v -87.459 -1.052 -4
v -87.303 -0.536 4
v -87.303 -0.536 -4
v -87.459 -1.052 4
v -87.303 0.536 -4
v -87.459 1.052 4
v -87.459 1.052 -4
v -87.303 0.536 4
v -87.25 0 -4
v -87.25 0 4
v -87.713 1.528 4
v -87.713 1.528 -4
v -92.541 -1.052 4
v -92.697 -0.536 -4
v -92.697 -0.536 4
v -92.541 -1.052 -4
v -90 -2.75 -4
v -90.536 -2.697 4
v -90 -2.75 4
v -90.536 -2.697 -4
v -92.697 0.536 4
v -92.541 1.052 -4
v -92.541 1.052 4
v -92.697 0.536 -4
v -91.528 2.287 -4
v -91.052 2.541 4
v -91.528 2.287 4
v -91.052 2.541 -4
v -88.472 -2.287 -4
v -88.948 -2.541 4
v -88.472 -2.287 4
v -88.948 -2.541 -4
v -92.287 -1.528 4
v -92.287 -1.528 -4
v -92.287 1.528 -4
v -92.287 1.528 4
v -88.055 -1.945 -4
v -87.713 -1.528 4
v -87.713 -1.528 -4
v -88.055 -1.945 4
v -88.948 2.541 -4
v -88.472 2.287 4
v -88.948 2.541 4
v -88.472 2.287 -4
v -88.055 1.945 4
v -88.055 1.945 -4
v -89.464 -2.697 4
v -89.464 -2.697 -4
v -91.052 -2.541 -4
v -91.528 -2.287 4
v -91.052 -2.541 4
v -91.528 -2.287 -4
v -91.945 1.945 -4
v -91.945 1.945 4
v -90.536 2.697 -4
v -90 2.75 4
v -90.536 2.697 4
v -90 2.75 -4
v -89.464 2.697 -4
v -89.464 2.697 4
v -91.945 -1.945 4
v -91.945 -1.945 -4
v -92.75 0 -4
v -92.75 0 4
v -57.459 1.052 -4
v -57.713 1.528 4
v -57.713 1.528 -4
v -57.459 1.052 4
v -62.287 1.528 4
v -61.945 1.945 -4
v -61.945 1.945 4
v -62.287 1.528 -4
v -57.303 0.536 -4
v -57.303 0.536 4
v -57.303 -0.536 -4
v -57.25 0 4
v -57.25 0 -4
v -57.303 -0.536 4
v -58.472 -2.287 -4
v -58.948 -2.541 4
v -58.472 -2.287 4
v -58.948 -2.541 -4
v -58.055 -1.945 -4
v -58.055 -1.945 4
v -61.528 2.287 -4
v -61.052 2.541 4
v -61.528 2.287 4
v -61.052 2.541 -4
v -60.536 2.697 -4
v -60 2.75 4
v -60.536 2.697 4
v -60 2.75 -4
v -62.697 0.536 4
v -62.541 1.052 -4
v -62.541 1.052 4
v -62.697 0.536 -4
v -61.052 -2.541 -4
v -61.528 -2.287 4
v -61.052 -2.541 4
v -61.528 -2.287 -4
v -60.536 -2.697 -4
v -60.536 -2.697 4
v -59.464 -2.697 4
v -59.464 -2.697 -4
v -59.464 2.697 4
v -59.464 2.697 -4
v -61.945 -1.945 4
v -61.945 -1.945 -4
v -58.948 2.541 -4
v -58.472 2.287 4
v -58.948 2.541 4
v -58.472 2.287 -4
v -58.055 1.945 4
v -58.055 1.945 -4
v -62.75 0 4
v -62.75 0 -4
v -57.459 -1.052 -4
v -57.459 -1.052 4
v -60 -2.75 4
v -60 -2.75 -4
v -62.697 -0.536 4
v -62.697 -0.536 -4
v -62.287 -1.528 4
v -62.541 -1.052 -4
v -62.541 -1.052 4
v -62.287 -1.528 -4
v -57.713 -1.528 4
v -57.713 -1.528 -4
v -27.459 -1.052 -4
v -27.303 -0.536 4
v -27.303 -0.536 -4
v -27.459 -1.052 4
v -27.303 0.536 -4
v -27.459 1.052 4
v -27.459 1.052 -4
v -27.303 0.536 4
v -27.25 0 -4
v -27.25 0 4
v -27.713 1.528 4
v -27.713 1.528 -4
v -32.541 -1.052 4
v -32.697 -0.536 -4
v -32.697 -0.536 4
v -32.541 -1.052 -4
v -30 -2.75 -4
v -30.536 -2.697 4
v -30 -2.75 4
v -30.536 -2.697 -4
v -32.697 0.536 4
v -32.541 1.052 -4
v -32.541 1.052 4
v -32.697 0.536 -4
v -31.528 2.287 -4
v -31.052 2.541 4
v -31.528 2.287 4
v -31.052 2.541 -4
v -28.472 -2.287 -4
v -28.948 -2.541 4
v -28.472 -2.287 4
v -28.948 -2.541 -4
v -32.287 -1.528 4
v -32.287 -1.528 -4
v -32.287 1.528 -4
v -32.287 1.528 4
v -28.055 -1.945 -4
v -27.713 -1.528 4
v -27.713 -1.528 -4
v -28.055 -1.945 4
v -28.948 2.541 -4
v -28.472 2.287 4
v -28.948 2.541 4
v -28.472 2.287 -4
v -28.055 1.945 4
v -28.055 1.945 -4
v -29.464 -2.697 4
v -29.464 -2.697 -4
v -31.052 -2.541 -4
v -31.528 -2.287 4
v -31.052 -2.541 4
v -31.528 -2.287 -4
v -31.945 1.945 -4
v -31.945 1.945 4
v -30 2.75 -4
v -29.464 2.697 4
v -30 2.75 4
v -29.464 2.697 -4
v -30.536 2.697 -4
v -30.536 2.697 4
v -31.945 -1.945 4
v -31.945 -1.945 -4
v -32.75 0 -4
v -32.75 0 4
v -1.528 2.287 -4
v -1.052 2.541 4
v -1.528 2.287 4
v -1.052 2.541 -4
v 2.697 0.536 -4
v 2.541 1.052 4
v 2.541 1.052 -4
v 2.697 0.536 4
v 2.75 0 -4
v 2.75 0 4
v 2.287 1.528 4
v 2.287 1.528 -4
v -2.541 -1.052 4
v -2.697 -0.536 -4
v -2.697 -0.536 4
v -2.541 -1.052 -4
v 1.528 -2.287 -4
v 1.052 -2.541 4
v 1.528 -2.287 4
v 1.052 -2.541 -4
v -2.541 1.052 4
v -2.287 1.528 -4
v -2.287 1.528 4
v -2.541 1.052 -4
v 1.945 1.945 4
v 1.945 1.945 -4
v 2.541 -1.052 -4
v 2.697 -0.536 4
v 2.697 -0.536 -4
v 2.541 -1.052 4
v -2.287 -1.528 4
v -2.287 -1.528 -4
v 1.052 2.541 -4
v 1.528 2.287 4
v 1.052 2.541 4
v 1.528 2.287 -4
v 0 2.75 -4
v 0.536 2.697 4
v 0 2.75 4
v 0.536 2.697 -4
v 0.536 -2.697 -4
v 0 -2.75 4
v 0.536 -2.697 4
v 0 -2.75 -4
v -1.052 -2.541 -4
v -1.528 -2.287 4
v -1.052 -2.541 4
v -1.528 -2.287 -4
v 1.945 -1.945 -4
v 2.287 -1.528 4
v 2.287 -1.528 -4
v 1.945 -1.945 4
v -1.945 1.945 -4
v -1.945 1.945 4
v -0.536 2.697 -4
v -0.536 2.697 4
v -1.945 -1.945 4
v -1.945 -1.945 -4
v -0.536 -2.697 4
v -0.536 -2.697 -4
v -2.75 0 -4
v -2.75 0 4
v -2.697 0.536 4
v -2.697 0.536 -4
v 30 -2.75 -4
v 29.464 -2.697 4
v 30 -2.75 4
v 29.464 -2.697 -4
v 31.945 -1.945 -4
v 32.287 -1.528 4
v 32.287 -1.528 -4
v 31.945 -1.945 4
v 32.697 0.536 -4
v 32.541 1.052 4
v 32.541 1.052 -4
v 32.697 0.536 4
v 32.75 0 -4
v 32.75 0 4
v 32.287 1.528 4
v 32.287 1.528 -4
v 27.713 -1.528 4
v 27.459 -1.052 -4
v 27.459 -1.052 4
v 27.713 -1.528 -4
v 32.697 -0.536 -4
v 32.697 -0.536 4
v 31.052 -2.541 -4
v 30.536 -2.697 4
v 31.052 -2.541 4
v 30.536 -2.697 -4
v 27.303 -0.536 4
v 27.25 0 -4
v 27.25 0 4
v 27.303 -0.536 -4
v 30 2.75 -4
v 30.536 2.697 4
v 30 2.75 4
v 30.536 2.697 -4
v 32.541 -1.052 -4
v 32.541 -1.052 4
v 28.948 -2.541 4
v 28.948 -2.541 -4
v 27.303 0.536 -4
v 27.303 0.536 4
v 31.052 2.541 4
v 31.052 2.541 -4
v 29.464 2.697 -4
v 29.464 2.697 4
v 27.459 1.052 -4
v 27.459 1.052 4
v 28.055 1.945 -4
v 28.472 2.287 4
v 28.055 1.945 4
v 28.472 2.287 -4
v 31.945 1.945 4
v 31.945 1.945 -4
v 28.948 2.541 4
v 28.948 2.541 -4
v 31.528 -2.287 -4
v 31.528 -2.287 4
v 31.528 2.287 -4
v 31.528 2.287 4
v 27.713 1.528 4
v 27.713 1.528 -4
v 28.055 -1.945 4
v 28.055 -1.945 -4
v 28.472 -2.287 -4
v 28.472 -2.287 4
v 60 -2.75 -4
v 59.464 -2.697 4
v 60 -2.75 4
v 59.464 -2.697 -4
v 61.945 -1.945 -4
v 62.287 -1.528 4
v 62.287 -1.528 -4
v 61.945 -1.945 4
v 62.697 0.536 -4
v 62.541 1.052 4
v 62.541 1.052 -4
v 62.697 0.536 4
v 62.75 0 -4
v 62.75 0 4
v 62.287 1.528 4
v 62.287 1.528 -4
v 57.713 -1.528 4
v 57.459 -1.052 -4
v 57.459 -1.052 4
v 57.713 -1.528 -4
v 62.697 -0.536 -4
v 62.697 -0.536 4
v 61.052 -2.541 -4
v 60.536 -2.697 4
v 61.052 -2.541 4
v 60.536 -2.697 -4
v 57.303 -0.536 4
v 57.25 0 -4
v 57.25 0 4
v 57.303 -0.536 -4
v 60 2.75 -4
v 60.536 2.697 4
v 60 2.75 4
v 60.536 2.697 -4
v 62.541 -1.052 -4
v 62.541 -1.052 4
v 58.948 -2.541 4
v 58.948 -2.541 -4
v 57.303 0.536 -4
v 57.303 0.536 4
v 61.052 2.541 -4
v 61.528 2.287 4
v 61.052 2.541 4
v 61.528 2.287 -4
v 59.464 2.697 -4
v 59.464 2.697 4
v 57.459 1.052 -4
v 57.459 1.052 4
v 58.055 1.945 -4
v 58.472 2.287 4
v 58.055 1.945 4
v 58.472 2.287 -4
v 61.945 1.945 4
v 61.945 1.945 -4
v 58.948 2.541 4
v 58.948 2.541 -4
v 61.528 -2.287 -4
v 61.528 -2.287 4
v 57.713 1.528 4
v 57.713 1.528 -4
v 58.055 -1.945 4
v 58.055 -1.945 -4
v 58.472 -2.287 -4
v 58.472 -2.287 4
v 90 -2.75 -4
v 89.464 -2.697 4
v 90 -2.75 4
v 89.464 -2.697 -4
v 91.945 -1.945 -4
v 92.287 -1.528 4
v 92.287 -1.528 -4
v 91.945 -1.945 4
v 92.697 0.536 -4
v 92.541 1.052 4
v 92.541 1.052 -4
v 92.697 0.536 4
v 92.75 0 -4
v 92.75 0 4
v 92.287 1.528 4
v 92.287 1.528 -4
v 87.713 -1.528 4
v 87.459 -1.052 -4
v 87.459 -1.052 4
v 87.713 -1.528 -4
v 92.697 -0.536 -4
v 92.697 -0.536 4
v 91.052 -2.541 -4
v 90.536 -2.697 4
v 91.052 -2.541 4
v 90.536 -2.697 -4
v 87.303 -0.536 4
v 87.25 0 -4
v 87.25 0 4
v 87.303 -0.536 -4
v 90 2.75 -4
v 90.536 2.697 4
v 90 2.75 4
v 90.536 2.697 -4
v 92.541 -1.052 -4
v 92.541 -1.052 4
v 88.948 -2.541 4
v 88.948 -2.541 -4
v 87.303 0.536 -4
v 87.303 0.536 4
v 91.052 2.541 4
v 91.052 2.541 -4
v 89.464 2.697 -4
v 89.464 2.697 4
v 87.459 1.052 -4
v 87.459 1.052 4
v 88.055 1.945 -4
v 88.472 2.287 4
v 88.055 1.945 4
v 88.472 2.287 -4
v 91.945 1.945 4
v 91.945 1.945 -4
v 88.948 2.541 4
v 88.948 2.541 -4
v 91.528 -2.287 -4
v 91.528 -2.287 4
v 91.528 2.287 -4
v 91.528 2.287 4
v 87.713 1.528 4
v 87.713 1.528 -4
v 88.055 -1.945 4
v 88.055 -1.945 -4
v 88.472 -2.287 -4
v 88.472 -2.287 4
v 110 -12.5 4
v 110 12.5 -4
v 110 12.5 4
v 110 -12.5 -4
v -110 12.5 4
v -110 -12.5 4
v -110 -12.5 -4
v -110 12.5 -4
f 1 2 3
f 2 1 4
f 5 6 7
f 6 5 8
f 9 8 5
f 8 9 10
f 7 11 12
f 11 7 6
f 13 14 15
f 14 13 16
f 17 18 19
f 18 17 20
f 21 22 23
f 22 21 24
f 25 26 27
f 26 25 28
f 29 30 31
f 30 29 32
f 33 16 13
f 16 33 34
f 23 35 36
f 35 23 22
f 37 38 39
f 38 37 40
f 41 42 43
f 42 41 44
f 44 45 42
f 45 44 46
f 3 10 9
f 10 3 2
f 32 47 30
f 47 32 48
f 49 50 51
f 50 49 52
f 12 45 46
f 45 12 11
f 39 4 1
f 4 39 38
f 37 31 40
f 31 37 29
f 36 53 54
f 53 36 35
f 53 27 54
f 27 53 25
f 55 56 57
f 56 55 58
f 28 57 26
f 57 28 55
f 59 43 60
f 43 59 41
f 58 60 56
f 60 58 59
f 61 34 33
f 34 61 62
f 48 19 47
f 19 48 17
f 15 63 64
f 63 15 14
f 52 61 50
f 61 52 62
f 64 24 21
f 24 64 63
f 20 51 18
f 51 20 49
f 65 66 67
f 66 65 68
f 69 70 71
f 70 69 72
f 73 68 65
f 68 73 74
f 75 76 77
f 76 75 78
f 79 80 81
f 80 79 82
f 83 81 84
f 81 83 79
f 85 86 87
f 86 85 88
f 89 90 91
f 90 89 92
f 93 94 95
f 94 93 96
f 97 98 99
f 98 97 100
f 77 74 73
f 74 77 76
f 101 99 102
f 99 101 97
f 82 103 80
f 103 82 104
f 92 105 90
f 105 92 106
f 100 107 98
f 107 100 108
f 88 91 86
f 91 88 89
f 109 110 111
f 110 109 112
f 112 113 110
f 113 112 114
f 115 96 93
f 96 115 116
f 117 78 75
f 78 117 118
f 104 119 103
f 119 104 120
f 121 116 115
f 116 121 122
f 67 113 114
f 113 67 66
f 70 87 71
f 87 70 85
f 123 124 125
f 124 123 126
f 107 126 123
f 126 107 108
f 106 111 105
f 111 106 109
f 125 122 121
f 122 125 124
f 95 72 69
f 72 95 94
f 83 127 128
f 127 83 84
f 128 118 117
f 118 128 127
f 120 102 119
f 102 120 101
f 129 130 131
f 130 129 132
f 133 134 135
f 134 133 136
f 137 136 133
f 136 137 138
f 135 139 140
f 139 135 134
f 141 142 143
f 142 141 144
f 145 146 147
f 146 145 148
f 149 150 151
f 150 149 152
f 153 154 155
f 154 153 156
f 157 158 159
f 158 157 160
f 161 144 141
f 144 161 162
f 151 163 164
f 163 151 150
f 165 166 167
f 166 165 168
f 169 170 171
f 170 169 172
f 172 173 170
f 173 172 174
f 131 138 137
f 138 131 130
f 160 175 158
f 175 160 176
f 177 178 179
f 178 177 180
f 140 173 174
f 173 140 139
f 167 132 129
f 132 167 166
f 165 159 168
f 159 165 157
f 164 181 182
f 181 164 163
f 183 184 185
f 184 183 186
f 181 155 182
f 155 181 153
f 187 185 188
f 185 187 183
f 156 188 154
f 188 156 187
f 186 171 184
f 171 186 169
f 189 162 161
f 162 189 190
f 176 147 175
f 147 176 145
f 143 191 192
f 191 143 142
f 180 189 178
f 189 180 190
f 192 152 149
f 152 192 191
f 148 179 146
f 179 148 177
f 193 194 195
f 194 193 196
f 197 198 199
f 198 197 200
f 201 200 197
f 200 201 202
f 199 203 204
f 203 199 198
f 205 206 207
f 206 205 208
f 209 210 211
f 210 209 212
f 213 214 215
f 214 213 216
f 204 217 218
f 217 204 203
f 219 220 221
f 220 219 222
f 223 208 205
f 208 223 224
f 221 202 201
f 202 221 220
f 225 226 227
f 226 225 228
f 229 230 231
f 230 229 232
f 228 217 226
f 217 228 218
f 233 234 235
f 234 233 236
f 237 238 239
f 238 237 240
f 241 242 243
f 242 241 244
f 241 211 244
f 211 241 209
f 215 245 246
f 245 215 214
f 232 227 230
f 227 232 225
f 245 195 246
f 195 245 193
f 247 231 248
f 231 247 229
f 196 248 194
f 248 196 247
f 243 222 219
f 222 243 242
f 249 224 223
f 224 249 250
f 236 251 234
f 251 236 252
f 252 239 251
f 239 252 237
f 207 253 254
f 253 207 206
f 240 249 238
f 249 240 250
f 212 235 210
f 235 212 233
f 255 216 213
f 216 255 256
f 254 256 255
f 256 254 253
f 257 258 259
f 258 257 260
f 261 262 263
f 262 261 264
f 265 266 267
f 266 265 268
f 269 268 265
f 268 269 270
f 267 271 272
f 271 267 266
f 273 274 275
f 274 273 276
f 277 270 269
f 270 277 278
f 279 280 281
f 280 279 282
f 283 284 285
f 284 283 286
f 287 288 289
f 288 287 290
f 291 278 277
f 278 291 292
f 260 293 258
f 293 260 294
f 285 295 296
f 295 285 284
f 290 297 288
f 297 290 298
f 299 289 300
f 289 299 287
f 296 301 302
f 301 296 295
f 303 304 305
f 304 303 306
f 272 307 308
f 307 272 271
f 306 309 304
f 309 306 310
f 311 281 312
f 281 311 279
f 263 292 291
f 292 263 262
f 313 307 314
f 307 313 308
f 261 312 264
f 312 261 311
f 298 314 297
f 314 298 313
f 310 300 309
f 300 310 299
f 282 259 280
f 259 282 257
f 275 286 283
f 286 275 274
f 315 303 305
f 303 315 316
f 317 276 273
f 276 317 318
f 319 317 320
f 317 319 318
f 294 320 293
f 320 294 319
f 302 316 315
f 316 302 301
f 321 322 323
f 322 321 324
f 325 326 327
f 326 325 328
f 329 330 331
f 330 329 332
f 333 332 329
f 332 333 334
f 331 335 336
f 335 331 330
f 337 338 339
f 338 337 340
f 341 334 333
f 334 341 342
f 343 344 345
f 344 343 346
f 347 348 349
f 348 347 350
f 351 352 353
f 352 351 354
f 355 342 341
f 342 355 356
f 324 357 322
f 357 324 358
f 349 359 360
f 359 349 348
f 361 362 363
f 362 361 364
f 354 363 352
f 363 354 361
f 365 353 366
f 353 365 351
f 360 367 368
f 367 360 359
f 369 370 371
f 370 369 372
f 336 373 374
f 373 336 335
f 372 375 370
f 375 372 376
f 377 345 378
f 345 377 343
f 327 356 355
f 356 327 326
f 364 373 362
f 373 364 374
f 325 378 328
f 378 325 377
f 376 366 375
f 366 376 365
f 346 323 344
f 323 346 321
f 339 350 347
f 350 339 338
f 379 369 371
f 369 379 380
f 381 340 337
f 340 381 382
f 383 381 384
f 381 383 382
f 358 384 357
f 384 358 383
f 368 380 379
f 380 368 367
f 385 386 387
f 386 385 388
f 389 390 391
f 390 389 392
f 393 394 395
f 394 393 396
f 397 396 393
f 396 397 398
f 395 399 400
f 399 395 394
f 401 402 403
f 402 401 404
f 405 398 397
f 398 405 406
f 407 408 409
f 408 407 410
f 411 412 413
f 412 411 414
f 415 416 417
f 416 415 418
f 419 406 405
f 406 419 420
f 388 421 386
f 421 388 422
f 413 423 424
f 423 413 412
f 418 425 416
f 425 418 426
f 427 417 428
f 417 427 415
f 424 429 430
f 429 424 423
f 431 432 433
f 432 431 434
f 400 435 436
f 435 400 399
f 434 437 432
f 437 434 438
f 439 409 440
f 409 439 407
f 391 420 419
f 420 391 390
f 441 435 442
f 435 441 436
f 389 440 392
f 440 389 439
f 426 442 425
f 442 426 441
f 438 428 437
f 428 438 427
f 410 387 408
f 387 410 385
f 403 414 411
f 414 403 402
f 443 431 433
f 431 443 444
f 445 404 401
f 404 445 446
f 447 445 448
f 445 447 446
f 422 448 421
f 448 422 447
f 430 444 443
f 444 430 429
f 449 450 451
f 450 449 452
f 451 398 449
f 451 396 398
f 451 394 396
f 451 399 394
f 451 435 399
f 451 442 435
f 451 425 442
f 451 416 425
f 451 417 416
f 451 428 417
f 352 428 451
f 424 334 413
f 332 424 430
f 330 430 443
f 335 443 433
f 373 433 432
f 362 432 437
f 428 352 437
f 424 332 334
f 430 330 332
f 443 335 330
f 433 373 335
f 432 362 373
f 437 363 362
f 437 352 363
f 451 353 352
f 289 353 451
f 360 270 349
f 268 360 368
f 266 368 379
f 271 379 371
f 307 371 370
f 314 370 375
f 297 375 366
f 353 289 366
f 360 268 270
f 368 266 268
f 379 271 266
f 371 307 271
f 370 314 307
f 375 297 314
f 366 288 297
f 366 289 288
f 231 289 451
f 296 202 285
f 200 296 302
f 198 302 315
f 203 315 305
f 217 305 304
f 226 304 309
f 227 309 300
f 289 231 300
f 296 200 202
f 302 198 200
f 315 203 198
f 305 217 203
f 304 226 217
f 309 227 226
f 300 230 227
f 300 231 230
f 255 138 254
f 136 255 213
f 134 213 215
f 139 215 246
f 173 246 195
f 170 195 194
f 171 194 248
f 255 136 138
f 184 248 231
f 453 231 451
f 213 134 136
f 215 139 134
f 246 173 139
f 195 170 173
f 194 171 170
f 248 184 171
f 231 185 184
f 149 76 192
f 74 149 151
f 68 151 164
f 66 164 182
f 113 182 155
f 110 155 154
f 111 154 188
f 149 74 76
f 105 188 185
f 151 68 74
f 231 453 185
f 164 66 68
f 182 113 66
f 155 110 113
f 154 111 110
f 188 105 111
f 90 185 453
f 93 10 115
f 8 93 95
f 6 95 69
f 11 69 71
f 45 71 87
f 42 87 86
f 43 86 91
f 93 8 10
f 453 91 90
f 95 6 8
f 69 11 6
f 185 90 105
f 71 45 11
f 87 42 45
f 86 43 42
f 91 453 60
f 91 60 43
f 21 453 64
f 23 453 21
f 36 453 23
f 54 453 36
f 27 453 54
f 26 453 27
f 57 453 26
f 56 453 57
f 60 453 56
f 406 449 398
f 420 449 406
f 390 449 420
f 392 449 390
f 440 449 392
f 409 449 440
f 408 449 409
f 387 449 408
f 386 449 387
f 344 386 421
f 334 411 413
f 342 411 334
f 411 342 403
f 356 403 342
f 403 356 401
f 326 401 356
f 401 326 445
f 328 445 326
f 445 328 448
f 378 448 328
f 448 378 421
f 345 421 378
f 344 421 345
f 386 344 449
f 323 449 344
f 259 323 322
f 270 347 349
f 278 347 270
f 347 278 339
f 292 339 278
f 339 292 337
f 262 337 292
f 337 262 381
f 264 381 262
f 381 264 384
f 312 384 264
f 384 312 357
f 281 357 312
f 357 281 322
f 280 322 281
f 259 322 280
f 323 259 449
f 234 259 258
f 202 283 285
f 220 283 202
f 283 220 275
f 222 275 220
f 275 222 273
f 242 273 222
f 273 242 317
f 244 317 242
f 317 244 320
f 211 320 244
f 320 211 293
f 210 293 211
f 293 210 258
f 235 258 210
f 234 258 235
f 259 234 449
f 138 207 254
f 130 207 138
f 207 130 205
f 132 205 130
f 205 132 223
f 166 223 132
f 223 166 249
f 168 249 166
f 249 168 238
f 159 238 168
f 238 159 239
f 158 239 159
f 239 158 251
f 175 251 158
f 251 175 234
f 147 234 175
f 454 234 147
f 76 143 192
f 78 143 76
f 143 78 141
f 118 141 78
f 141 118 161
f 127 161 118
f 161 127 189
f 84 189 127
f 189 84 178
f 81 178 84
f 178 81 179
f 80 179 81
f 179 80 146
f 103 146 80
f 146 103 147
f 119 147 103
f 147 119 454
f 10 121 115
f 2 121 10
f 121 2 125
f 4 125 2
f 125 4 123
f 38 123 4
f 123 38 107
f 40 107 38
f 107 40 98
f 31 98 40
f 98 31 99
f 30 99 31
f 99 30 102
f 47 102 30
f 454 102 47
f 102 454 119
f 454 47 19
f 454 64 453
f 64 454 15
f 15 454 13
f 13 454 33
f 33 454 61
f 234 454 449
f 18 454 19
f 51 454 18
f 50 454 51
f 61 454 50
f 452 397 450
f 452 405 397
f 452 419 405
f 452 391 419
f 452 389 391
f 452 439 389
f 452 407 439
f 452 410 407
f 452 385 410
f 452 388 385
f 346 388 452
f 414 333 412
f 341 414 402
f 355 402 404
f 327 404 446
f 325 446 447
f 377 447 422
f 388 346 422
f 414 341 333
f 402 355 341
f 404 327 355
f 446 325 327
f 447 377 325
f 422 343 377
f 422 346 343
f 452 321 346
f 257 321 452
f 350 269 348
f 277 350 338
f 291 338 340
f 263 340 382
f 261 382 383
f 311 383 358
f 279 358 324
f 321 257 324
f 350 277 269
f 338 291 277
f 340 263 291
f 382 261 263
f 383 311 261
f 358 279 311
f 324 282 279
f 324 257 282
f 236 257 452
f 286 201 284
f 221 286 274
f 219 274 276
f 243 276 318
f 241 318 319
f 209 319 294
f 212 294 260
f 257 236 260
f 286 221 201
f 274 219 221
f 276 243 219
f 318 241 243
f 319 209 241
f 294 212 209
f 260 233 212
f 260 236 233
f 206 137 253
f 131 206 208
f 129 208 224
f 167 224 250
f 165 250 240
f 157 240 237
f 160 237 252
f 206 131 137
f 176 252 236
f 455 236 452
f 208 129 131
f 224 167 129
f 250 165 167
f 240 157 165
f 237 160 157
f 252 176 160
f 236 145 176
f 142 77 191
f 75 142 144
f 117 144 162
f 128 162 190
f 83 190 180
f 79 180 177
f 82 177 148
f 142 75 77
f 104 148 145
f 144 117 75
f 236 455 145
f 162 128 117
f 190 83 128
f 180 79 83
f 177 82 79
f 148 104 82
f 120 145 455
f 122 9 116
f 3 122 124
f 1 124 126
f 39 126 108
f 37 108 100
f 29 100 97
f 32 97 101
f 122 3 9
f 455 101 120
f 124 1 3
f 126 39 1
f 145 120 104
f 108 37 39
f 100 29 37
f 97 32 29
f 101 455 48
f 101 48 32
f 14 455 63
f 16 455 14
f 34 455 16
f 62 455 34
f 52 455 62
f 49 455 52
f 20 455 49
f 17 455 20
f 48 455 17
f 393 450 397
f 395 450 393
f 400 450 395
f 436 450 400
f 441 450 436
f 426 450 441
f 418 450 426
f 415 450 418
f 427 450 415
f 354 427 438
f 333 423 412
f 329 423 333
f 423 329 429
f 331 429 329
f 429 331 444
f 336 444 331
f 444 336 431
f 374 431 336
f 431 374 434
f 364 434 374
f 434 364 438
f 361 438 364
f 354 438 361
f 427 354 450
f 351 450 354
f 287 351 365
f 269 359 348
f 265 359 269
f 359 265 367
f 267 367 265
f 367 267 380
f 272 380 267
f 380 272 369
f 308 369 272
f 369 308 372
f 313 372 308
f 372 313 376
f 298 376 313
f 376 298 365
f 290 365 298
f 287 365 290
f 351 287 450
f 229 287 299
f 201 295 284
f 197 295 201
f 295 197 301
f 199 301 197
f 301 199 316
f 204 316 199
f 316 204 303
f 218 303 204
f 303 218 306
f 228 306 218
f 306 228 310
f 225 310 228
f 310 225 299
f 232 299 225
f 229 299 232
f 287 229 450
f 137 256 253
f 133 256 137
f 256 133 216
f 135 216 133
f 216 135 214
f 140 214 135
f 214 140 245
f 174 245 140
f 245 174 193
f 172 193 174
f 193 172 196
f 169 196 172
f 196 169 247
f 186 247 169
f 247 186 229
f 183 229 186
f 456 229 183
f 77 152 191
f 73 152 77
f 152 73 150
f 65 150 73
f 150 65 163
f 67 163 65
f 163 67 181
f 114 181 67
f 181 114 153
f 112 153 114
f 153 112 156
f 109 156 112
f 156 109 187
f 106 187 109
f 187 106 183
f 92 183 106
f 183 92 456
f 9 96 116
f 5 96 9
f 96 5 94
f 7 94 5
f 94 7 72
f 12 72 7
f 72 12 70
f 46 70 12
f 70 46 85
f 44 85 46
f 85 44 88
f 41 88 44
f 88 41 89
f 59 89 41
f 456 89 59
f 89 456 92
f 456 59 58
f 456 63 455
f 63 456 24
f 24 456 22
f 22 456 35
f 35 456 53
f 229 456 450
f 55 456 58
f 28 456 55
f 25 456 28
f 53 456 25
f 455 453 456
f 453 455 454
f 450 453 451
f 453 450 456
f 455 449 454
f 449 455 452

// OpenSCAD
$fn = 32;

// ----------------------------------------------------------------------
// Hole bar, 7 x Ø5.5
// skip layout, 20 mm edge offset
// ----------------------------------------------------------------------

// --- parameters (mm) ---
bar_w = 25;       // bar width (Y)
bar_t = 8;        // bar thickness (Z)
holes = 7;        // holes per row
hole_d = 5.5;     // hole diameter
edge = 20;        // offset from the bar end to the first hole
grid_pitch = 15;  // grid the bar was laid out on

// --- derived feature positions (mm) ---
pitch = grid_pitch * 2;       // = 30   holes sit every other grid slot
span = (holes - 1) * pitch;   // = 180   distance between the end holes
bar_l = span + 2 * edge;      // = 220   overall bar length
start_x = -bar_l / 2 + edge;  // = -90   X of the first hole
feature_centers = [
  [start_x + 0 * pitch, 0],
  [start_x + 1 * pitch, 0],
  [start_x + 2 * pitch, 0],
  [start_x + 3 * pitch, 0],
  [start_x + 4 * pitch, 0],
  [start_x + 5 * pitch, 0],
  [start_x + 6 * pitch, 0]
];   // hole centres of the first row

// bar with one row of holes, drilled from feature_centers
difference() {
  translate([-bar_l / 2, -bar_w / 2, -bar_t / 2]) cube([bar_l, bar_w, bar_t]);
  for (centre = feature_centers)
    translate([centre[0], centre[1], 0])
      cylinder(d = hole_d, h = bar_t + 2, center = true);
}
